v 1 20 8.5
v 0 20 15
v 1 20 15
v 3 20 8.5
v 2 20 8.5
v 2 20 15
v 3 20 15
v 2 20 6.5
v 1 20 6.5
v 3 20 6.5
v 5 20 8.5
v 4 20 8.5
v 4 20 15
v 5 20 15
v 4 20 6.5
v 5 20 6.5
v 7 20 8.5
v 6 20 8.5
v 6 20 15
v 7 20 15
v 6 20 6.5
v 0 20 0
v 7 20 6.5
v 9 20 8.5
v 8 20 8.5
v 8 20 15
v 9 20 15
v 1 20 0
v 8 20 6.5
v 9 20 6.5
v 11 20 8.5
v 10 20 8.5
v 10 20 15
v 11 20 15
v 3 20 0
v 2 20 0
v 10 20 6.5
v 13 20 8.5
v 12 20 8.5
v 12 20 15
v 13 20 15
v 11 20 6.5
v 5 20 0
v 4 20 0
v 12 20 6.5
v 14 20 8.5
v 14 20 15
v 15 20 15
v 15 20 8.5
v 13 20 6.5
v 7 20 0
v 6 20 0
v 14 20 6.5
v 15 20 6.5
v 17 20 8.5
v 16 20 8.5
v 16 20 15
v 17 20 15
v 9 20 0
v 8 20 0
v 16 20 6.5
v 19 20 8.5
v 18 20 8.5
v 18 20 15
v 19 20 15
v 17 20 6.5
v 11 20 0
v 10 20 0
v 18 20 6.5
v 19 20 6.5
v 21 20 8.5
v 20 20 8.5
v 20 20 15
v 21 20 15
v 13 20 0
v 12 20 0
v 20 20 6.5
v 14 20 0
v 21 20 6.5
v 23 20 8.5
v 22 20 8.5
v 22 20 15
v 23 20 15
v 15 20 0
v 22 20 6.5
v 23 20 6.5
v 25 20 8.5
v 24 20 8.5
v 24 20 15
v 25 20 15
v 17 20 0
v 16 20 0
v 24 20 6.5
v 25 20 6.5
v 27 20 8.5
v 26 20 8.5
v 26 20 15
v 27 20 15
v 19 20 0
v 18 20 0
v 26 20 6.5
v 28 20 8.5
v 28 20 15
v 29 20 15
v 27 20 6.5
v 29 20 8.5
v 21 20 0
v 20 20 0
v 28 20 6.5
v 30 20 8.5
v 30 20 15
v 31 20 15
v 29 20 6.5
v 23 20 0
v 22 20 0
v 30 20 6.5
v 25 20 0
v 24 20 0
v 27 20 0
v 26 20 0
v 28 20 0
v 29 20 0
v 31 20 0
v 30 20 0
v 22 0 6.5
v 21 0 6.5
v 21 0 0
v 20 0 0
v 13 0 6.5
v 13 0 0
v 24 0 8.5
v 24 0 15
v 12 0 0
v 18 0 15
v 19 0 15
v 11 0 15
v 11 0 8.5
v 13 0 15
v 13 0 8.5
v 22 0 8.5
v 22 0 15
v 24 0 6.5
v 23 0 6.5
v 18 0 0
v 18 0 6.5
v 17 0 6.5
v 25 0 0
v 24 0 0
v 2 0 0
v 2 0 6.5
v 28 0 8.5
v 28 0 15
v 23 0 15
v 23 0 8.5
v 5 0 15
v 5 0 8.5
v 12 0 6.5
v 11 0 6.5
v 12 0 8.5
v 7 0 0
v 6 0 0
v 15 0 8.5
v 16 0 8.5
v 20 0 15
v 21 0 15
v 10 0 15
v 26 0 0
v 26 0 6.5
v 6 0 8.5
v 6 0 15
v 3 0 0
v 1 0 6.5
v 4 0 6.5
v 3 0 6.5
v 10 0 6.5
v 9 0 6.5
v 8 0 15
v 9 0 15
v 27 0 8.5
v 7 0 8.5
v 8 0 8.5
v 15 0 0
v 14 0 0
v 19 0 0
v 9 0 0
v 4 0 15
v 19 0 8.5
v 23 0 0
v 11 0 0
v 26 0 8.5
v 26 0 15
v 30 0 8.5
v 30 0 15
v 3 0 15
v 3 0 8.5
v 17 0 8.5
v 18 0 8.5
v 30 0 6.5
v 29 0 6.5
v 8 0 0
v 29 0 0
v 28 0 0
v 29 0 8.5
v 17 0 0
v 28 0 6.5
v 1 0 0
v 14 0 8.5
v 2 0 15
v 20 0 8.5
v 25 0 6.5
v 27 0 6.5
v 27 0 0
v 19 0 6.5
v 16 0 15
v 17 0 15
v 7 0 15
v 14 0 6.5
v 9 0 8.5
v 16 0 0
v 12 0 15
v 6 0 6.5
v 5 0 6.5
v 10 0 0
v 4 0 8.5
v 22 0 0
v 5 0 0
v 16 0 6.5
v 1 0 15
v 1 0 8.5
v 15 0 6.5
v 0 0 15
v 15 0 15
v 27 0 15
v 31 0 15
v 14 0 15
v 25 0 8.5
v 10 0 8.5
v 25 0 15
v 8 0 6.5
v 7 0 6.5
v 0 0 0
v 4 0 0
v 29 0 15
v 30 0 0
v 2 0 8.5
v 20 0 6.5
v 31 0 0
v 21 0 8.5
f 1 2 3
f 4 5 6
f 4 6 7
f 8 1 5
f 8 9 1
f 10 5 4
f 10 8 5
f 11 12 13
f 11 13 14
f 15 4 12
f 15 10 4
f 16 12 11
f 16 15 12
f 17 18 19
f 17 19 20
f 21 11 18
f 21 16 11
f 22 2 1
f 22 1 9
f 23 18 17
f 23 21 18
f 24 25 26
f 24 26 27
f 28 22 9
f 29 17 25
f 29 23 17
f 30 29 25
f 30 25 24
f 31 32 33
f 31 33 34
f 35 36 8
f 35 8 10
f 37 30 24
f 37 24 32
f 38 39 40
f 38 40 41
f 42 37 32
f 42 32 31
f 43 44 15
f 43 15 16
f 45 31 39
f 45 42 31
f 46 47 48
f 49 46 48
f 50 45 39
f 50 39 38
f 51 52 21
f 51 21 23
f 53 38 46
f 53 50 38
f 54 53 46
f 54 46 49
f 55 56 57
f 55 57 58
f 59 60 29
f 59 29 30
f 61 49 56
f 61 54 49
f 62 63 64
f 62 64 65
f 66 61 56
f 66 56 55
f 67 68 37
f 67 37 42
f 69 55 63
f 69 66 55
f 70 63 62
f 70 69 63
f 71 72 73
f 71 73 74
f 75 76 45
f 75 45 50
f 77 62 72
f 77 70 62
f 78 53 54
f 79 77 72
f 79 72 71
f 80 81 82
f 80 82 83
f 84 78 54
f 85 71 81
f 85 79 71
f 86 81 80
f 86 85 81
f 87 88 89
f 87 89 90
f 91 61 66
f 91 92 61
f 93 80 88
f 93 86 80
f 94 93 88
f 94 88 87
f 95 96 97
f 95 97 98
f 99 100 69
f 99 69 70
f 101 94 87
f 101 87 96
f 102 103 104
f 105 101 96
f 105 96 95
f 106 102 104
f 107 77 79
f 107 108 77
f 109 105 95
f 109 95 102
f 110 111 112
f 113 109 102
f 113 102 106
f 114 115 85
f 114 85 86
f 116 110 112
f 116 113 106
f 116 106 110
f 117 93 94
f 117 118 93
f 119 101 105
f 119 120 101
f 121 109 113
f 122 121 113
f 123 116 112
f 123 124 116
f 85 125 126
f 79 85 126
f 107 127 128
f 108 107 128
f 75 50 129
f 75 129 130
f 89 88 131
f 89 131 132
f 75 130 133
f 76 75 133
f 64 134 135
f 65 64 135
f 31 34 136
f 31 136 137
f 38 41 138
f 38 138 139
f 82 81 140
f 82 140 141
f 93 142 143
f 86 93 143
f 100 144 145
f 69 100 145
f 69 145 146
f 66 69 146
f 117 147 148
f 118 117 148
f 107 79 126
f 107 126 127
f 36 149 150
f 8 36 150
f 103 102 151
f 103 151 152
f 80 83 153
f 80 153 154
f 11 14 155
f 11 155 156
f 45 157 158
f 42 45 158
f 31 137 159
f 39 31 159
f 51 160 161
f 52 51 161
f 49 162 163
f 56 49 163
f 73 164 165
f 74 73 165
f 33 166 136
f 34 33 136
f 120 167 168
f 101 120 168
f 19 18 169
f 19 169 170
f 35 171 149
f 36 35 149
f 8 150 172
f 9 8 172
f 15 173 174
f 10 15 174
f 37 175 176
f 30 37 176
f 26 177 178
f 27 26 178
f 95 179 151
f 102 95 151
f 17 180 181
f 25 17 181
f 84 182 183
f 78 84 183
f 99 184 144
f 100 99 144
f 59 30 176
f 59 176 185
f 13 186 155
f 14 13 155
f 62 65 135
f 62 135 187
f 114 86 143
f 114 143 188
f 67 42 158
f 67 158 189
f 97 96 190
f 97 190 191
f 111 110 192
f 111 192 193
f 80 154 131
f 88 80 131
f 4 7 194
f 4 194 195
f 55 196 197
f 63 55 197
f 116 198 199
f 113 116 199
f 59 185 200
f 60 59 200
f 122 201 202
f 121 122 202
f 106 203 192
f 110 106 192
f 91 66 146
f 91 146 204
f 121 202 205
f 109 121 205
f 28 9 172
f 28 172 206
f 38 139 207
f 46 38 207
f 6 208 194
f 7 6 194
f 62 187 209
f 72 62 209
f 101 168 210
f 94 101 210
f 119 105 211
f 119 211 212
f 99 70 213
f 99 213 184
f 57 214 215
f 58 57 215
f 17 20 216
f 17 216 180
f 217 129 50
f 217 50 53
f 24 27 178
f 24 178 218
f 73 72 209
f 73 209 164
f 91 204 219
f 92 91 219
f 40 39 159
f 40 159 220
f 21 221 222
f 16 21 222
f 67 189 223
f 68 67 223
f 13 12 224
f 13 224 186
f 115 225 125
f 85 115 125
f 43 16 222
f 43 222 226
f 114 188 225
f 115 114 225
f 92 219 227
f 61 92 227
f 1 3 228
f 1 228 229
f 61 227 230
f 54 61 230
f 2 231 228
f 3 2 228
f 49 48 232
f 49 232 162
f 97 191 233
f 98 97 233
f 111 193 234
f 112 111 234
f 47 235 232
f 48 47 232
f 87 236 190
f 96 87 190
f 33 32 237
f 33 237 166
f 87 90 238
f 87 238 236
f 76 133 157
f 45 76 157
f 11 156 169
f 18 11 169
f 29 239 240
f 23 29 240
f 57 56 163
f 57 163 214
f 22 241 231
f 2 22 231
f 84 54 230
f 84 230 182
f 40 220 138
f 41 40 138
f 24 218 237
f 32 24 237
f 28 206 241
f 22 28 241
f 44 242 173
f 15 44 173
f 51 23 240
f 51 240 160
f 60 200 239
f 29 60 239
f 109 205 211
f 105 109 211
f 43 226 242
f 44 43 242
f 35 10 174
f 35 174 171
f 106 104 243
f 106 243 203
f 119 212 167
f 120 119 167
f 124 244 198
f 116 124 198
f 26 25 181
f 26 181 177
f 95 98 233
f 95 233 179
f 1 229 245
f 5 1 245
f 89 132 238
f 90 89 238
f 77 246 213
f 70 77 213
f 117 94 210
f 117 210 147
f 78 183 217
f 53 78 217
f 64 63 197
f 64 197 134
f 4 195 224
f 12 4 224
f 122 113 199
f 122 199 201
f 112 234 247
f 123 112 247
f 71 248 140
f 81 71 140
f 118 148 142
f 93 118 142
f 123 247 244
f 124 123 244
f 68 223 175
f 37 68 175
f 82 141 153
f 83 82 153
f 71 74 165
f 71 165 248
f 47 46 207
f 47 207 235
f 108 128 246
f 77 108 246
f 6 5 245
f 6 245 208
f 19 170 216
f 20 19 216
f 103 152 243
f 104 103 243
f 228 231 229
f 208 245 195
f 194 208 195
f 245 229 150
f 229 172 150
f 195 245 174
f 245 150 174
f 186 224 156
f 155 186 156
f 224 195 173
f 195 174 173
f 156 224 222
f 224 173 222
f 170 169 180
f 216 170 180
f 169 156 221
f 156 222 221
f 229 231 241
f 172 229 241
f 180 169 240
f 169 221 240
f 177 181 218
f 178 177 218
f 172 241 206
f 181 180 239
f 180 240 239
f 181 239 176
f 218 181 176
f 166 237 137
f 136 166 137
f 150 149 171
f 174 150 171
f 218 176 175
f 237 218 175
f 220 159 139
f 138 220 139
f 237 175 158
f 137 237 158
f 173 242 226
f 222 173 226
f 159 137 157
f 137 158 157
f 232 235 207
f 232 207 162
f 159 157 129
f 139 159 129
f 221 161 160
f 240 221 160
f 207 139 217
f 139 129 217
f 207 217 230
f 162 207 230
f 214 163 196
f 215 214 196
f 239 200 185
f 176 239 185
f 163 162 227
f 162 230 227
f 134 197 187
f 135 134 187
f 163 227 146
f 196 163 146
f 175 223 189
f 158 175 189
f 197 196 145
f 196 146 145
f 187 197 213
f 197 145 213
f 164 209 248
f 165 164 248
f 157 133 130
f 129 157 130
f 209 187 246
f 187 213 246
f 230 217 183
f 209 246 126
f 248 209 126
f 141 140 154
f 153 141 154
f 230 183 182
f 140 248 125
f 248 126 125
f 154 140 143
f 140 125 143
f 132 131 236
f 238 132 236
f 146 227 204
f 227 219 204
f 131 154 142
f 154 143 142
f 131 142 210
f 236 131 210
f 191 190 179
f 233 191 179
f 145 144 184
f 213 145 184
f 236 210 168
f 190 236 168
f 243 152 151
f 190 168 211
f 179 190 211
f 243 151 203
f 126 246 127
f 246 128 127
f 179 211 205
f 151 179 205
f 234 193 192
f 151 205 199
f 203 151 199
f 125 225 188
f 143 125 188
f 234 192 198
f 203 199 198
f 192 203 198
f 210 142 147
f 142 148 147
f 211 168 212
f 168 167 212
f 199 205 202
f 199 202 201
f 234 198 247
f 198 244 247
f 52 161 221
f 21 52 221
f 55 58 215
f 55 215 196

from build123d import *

# Parameters (mm, degrees)
SKETCH2_W           = 1
SKETCH2_H           = 2
BOSS_EXTRUDE1_DEPTH = 20


with BuildPart() as part:
    # Sketch2 → Boss-Extrude1 (new body)
    with BuildSketch(Plane(origin=(0, 0, 0), x_dir=(1, 0, 0), z_dir=(0, 1, 0))):
        Polygon((1, 0), (0, 0), (0, -15), (1, -15), (1, -8.5), (2, -8.5), (2, -6.5), (1, -6.5), align=None)
        Polygon((2, 0), (2, -6.5), (2, -8.5), (2, -15), (3, -15), (3, -8.5), (4, -8.5), (4, -6.5), (3, -6.5), (3, 0), align=None)
        Polygon((4, 0), (4, -6.5), (4, -8.5), (4, -15), (5, -15), (5, -8.5), (6, -8.5), (6, -6.5), (5, -6.5), (5, 0), align=None)
        Polygon((6, 0), (6, -6.5), (6, -8.5), (6, -15), (7, -15), (7, -8.5), (8, -8.5), (8, -6.5), (7, -6.5), (7, 0), align=None)
        Polygon((8, 0), (8, -6.5), (8, -8.5), (8, -15), (9, -15), (9, -8.5), (10, -8.5), (10, -6.5), (9, -6.5), (9, 0), align=None)
        Polygon((10, 0), (10, -6.5), (10, -8.5), (10, -15), (11, -15), (11, -8.5), (12, -8.5), (12, -6.5), (11, -6.5), (11, 0), align=None)
        Polygon((12, 0), (12, -6.5), (12, -8.5), (12, -15), (13, -15), (13, -8.5), (13, -6.5), (13, 0), align=None)
        with Locations((13.5, -7.5)):
            Rectangle(SKETCH2_W, SKETCH2_H)
        Polygon((14, 0), (14, -6.5), (14, -8.5), (14, -15), (15, -15), (15, -8.5), (16, -8.5), (16, -6.5), (15, -6.5), (15, 0), align=None)
        Polygon((16, 0), (16, -6.5), (16, -8.5), (16, -15), (17, -15), (17, -8.5), (18, -8.5), (18, -6.5), (17, -6.5), (17, 0), align=None)
        Polygon((18, 0), (18, -6.5), (18, -8.5), (18, -15), (19, -15), (19, -8.5), (20, -8.5), (20, -6.5), (19, -6.5), (19, 0), align=None)
        Polygon((20, 0), (20, -6.5), (20, -8.5), (20, -15), (21, -15), (21, -8.5), (22, -8.5), (22, -6.5), (21, -6.5), (21, 0), align=None)
        Polygon((22, 0), (22, -6.5), (22, -8.5), (22, -15), (23, -15), (23, -8.5), (24, -8.5), (24, -6.5), (23, -6.5), (23, 0), align=None)
        Polygon((24, 0), (24, -6.5), (24, -8.5), (24, -15), (25, -15), (25, -8.5), (26, -8.5), (26, -6.5), (25, -6.5), (25, 0), align=None)
        Polygon((26, 0), (26, -6.5), (26, -8.5), (26, -15), (27, -15), (27, -8.5), (28, -8.5), (28, -6.5), (27, -6.5), (27, 0), align=None)
        Polygon((28, 0), (28, -6.5), (28, -8.5), (28, -15), (29, -15), (29, -8.5), (30, -8.5), (30, -6.5), (29, -6.5), (29, 0), align=None)
        Polygon((30, 0), (30, -6.5), (30, -8.5), (30, -15), (31, -15), (31, 0), align=None)
    extrude(amount=BOSS_EXTRUDE1_DEPTH)


solid = part.part
